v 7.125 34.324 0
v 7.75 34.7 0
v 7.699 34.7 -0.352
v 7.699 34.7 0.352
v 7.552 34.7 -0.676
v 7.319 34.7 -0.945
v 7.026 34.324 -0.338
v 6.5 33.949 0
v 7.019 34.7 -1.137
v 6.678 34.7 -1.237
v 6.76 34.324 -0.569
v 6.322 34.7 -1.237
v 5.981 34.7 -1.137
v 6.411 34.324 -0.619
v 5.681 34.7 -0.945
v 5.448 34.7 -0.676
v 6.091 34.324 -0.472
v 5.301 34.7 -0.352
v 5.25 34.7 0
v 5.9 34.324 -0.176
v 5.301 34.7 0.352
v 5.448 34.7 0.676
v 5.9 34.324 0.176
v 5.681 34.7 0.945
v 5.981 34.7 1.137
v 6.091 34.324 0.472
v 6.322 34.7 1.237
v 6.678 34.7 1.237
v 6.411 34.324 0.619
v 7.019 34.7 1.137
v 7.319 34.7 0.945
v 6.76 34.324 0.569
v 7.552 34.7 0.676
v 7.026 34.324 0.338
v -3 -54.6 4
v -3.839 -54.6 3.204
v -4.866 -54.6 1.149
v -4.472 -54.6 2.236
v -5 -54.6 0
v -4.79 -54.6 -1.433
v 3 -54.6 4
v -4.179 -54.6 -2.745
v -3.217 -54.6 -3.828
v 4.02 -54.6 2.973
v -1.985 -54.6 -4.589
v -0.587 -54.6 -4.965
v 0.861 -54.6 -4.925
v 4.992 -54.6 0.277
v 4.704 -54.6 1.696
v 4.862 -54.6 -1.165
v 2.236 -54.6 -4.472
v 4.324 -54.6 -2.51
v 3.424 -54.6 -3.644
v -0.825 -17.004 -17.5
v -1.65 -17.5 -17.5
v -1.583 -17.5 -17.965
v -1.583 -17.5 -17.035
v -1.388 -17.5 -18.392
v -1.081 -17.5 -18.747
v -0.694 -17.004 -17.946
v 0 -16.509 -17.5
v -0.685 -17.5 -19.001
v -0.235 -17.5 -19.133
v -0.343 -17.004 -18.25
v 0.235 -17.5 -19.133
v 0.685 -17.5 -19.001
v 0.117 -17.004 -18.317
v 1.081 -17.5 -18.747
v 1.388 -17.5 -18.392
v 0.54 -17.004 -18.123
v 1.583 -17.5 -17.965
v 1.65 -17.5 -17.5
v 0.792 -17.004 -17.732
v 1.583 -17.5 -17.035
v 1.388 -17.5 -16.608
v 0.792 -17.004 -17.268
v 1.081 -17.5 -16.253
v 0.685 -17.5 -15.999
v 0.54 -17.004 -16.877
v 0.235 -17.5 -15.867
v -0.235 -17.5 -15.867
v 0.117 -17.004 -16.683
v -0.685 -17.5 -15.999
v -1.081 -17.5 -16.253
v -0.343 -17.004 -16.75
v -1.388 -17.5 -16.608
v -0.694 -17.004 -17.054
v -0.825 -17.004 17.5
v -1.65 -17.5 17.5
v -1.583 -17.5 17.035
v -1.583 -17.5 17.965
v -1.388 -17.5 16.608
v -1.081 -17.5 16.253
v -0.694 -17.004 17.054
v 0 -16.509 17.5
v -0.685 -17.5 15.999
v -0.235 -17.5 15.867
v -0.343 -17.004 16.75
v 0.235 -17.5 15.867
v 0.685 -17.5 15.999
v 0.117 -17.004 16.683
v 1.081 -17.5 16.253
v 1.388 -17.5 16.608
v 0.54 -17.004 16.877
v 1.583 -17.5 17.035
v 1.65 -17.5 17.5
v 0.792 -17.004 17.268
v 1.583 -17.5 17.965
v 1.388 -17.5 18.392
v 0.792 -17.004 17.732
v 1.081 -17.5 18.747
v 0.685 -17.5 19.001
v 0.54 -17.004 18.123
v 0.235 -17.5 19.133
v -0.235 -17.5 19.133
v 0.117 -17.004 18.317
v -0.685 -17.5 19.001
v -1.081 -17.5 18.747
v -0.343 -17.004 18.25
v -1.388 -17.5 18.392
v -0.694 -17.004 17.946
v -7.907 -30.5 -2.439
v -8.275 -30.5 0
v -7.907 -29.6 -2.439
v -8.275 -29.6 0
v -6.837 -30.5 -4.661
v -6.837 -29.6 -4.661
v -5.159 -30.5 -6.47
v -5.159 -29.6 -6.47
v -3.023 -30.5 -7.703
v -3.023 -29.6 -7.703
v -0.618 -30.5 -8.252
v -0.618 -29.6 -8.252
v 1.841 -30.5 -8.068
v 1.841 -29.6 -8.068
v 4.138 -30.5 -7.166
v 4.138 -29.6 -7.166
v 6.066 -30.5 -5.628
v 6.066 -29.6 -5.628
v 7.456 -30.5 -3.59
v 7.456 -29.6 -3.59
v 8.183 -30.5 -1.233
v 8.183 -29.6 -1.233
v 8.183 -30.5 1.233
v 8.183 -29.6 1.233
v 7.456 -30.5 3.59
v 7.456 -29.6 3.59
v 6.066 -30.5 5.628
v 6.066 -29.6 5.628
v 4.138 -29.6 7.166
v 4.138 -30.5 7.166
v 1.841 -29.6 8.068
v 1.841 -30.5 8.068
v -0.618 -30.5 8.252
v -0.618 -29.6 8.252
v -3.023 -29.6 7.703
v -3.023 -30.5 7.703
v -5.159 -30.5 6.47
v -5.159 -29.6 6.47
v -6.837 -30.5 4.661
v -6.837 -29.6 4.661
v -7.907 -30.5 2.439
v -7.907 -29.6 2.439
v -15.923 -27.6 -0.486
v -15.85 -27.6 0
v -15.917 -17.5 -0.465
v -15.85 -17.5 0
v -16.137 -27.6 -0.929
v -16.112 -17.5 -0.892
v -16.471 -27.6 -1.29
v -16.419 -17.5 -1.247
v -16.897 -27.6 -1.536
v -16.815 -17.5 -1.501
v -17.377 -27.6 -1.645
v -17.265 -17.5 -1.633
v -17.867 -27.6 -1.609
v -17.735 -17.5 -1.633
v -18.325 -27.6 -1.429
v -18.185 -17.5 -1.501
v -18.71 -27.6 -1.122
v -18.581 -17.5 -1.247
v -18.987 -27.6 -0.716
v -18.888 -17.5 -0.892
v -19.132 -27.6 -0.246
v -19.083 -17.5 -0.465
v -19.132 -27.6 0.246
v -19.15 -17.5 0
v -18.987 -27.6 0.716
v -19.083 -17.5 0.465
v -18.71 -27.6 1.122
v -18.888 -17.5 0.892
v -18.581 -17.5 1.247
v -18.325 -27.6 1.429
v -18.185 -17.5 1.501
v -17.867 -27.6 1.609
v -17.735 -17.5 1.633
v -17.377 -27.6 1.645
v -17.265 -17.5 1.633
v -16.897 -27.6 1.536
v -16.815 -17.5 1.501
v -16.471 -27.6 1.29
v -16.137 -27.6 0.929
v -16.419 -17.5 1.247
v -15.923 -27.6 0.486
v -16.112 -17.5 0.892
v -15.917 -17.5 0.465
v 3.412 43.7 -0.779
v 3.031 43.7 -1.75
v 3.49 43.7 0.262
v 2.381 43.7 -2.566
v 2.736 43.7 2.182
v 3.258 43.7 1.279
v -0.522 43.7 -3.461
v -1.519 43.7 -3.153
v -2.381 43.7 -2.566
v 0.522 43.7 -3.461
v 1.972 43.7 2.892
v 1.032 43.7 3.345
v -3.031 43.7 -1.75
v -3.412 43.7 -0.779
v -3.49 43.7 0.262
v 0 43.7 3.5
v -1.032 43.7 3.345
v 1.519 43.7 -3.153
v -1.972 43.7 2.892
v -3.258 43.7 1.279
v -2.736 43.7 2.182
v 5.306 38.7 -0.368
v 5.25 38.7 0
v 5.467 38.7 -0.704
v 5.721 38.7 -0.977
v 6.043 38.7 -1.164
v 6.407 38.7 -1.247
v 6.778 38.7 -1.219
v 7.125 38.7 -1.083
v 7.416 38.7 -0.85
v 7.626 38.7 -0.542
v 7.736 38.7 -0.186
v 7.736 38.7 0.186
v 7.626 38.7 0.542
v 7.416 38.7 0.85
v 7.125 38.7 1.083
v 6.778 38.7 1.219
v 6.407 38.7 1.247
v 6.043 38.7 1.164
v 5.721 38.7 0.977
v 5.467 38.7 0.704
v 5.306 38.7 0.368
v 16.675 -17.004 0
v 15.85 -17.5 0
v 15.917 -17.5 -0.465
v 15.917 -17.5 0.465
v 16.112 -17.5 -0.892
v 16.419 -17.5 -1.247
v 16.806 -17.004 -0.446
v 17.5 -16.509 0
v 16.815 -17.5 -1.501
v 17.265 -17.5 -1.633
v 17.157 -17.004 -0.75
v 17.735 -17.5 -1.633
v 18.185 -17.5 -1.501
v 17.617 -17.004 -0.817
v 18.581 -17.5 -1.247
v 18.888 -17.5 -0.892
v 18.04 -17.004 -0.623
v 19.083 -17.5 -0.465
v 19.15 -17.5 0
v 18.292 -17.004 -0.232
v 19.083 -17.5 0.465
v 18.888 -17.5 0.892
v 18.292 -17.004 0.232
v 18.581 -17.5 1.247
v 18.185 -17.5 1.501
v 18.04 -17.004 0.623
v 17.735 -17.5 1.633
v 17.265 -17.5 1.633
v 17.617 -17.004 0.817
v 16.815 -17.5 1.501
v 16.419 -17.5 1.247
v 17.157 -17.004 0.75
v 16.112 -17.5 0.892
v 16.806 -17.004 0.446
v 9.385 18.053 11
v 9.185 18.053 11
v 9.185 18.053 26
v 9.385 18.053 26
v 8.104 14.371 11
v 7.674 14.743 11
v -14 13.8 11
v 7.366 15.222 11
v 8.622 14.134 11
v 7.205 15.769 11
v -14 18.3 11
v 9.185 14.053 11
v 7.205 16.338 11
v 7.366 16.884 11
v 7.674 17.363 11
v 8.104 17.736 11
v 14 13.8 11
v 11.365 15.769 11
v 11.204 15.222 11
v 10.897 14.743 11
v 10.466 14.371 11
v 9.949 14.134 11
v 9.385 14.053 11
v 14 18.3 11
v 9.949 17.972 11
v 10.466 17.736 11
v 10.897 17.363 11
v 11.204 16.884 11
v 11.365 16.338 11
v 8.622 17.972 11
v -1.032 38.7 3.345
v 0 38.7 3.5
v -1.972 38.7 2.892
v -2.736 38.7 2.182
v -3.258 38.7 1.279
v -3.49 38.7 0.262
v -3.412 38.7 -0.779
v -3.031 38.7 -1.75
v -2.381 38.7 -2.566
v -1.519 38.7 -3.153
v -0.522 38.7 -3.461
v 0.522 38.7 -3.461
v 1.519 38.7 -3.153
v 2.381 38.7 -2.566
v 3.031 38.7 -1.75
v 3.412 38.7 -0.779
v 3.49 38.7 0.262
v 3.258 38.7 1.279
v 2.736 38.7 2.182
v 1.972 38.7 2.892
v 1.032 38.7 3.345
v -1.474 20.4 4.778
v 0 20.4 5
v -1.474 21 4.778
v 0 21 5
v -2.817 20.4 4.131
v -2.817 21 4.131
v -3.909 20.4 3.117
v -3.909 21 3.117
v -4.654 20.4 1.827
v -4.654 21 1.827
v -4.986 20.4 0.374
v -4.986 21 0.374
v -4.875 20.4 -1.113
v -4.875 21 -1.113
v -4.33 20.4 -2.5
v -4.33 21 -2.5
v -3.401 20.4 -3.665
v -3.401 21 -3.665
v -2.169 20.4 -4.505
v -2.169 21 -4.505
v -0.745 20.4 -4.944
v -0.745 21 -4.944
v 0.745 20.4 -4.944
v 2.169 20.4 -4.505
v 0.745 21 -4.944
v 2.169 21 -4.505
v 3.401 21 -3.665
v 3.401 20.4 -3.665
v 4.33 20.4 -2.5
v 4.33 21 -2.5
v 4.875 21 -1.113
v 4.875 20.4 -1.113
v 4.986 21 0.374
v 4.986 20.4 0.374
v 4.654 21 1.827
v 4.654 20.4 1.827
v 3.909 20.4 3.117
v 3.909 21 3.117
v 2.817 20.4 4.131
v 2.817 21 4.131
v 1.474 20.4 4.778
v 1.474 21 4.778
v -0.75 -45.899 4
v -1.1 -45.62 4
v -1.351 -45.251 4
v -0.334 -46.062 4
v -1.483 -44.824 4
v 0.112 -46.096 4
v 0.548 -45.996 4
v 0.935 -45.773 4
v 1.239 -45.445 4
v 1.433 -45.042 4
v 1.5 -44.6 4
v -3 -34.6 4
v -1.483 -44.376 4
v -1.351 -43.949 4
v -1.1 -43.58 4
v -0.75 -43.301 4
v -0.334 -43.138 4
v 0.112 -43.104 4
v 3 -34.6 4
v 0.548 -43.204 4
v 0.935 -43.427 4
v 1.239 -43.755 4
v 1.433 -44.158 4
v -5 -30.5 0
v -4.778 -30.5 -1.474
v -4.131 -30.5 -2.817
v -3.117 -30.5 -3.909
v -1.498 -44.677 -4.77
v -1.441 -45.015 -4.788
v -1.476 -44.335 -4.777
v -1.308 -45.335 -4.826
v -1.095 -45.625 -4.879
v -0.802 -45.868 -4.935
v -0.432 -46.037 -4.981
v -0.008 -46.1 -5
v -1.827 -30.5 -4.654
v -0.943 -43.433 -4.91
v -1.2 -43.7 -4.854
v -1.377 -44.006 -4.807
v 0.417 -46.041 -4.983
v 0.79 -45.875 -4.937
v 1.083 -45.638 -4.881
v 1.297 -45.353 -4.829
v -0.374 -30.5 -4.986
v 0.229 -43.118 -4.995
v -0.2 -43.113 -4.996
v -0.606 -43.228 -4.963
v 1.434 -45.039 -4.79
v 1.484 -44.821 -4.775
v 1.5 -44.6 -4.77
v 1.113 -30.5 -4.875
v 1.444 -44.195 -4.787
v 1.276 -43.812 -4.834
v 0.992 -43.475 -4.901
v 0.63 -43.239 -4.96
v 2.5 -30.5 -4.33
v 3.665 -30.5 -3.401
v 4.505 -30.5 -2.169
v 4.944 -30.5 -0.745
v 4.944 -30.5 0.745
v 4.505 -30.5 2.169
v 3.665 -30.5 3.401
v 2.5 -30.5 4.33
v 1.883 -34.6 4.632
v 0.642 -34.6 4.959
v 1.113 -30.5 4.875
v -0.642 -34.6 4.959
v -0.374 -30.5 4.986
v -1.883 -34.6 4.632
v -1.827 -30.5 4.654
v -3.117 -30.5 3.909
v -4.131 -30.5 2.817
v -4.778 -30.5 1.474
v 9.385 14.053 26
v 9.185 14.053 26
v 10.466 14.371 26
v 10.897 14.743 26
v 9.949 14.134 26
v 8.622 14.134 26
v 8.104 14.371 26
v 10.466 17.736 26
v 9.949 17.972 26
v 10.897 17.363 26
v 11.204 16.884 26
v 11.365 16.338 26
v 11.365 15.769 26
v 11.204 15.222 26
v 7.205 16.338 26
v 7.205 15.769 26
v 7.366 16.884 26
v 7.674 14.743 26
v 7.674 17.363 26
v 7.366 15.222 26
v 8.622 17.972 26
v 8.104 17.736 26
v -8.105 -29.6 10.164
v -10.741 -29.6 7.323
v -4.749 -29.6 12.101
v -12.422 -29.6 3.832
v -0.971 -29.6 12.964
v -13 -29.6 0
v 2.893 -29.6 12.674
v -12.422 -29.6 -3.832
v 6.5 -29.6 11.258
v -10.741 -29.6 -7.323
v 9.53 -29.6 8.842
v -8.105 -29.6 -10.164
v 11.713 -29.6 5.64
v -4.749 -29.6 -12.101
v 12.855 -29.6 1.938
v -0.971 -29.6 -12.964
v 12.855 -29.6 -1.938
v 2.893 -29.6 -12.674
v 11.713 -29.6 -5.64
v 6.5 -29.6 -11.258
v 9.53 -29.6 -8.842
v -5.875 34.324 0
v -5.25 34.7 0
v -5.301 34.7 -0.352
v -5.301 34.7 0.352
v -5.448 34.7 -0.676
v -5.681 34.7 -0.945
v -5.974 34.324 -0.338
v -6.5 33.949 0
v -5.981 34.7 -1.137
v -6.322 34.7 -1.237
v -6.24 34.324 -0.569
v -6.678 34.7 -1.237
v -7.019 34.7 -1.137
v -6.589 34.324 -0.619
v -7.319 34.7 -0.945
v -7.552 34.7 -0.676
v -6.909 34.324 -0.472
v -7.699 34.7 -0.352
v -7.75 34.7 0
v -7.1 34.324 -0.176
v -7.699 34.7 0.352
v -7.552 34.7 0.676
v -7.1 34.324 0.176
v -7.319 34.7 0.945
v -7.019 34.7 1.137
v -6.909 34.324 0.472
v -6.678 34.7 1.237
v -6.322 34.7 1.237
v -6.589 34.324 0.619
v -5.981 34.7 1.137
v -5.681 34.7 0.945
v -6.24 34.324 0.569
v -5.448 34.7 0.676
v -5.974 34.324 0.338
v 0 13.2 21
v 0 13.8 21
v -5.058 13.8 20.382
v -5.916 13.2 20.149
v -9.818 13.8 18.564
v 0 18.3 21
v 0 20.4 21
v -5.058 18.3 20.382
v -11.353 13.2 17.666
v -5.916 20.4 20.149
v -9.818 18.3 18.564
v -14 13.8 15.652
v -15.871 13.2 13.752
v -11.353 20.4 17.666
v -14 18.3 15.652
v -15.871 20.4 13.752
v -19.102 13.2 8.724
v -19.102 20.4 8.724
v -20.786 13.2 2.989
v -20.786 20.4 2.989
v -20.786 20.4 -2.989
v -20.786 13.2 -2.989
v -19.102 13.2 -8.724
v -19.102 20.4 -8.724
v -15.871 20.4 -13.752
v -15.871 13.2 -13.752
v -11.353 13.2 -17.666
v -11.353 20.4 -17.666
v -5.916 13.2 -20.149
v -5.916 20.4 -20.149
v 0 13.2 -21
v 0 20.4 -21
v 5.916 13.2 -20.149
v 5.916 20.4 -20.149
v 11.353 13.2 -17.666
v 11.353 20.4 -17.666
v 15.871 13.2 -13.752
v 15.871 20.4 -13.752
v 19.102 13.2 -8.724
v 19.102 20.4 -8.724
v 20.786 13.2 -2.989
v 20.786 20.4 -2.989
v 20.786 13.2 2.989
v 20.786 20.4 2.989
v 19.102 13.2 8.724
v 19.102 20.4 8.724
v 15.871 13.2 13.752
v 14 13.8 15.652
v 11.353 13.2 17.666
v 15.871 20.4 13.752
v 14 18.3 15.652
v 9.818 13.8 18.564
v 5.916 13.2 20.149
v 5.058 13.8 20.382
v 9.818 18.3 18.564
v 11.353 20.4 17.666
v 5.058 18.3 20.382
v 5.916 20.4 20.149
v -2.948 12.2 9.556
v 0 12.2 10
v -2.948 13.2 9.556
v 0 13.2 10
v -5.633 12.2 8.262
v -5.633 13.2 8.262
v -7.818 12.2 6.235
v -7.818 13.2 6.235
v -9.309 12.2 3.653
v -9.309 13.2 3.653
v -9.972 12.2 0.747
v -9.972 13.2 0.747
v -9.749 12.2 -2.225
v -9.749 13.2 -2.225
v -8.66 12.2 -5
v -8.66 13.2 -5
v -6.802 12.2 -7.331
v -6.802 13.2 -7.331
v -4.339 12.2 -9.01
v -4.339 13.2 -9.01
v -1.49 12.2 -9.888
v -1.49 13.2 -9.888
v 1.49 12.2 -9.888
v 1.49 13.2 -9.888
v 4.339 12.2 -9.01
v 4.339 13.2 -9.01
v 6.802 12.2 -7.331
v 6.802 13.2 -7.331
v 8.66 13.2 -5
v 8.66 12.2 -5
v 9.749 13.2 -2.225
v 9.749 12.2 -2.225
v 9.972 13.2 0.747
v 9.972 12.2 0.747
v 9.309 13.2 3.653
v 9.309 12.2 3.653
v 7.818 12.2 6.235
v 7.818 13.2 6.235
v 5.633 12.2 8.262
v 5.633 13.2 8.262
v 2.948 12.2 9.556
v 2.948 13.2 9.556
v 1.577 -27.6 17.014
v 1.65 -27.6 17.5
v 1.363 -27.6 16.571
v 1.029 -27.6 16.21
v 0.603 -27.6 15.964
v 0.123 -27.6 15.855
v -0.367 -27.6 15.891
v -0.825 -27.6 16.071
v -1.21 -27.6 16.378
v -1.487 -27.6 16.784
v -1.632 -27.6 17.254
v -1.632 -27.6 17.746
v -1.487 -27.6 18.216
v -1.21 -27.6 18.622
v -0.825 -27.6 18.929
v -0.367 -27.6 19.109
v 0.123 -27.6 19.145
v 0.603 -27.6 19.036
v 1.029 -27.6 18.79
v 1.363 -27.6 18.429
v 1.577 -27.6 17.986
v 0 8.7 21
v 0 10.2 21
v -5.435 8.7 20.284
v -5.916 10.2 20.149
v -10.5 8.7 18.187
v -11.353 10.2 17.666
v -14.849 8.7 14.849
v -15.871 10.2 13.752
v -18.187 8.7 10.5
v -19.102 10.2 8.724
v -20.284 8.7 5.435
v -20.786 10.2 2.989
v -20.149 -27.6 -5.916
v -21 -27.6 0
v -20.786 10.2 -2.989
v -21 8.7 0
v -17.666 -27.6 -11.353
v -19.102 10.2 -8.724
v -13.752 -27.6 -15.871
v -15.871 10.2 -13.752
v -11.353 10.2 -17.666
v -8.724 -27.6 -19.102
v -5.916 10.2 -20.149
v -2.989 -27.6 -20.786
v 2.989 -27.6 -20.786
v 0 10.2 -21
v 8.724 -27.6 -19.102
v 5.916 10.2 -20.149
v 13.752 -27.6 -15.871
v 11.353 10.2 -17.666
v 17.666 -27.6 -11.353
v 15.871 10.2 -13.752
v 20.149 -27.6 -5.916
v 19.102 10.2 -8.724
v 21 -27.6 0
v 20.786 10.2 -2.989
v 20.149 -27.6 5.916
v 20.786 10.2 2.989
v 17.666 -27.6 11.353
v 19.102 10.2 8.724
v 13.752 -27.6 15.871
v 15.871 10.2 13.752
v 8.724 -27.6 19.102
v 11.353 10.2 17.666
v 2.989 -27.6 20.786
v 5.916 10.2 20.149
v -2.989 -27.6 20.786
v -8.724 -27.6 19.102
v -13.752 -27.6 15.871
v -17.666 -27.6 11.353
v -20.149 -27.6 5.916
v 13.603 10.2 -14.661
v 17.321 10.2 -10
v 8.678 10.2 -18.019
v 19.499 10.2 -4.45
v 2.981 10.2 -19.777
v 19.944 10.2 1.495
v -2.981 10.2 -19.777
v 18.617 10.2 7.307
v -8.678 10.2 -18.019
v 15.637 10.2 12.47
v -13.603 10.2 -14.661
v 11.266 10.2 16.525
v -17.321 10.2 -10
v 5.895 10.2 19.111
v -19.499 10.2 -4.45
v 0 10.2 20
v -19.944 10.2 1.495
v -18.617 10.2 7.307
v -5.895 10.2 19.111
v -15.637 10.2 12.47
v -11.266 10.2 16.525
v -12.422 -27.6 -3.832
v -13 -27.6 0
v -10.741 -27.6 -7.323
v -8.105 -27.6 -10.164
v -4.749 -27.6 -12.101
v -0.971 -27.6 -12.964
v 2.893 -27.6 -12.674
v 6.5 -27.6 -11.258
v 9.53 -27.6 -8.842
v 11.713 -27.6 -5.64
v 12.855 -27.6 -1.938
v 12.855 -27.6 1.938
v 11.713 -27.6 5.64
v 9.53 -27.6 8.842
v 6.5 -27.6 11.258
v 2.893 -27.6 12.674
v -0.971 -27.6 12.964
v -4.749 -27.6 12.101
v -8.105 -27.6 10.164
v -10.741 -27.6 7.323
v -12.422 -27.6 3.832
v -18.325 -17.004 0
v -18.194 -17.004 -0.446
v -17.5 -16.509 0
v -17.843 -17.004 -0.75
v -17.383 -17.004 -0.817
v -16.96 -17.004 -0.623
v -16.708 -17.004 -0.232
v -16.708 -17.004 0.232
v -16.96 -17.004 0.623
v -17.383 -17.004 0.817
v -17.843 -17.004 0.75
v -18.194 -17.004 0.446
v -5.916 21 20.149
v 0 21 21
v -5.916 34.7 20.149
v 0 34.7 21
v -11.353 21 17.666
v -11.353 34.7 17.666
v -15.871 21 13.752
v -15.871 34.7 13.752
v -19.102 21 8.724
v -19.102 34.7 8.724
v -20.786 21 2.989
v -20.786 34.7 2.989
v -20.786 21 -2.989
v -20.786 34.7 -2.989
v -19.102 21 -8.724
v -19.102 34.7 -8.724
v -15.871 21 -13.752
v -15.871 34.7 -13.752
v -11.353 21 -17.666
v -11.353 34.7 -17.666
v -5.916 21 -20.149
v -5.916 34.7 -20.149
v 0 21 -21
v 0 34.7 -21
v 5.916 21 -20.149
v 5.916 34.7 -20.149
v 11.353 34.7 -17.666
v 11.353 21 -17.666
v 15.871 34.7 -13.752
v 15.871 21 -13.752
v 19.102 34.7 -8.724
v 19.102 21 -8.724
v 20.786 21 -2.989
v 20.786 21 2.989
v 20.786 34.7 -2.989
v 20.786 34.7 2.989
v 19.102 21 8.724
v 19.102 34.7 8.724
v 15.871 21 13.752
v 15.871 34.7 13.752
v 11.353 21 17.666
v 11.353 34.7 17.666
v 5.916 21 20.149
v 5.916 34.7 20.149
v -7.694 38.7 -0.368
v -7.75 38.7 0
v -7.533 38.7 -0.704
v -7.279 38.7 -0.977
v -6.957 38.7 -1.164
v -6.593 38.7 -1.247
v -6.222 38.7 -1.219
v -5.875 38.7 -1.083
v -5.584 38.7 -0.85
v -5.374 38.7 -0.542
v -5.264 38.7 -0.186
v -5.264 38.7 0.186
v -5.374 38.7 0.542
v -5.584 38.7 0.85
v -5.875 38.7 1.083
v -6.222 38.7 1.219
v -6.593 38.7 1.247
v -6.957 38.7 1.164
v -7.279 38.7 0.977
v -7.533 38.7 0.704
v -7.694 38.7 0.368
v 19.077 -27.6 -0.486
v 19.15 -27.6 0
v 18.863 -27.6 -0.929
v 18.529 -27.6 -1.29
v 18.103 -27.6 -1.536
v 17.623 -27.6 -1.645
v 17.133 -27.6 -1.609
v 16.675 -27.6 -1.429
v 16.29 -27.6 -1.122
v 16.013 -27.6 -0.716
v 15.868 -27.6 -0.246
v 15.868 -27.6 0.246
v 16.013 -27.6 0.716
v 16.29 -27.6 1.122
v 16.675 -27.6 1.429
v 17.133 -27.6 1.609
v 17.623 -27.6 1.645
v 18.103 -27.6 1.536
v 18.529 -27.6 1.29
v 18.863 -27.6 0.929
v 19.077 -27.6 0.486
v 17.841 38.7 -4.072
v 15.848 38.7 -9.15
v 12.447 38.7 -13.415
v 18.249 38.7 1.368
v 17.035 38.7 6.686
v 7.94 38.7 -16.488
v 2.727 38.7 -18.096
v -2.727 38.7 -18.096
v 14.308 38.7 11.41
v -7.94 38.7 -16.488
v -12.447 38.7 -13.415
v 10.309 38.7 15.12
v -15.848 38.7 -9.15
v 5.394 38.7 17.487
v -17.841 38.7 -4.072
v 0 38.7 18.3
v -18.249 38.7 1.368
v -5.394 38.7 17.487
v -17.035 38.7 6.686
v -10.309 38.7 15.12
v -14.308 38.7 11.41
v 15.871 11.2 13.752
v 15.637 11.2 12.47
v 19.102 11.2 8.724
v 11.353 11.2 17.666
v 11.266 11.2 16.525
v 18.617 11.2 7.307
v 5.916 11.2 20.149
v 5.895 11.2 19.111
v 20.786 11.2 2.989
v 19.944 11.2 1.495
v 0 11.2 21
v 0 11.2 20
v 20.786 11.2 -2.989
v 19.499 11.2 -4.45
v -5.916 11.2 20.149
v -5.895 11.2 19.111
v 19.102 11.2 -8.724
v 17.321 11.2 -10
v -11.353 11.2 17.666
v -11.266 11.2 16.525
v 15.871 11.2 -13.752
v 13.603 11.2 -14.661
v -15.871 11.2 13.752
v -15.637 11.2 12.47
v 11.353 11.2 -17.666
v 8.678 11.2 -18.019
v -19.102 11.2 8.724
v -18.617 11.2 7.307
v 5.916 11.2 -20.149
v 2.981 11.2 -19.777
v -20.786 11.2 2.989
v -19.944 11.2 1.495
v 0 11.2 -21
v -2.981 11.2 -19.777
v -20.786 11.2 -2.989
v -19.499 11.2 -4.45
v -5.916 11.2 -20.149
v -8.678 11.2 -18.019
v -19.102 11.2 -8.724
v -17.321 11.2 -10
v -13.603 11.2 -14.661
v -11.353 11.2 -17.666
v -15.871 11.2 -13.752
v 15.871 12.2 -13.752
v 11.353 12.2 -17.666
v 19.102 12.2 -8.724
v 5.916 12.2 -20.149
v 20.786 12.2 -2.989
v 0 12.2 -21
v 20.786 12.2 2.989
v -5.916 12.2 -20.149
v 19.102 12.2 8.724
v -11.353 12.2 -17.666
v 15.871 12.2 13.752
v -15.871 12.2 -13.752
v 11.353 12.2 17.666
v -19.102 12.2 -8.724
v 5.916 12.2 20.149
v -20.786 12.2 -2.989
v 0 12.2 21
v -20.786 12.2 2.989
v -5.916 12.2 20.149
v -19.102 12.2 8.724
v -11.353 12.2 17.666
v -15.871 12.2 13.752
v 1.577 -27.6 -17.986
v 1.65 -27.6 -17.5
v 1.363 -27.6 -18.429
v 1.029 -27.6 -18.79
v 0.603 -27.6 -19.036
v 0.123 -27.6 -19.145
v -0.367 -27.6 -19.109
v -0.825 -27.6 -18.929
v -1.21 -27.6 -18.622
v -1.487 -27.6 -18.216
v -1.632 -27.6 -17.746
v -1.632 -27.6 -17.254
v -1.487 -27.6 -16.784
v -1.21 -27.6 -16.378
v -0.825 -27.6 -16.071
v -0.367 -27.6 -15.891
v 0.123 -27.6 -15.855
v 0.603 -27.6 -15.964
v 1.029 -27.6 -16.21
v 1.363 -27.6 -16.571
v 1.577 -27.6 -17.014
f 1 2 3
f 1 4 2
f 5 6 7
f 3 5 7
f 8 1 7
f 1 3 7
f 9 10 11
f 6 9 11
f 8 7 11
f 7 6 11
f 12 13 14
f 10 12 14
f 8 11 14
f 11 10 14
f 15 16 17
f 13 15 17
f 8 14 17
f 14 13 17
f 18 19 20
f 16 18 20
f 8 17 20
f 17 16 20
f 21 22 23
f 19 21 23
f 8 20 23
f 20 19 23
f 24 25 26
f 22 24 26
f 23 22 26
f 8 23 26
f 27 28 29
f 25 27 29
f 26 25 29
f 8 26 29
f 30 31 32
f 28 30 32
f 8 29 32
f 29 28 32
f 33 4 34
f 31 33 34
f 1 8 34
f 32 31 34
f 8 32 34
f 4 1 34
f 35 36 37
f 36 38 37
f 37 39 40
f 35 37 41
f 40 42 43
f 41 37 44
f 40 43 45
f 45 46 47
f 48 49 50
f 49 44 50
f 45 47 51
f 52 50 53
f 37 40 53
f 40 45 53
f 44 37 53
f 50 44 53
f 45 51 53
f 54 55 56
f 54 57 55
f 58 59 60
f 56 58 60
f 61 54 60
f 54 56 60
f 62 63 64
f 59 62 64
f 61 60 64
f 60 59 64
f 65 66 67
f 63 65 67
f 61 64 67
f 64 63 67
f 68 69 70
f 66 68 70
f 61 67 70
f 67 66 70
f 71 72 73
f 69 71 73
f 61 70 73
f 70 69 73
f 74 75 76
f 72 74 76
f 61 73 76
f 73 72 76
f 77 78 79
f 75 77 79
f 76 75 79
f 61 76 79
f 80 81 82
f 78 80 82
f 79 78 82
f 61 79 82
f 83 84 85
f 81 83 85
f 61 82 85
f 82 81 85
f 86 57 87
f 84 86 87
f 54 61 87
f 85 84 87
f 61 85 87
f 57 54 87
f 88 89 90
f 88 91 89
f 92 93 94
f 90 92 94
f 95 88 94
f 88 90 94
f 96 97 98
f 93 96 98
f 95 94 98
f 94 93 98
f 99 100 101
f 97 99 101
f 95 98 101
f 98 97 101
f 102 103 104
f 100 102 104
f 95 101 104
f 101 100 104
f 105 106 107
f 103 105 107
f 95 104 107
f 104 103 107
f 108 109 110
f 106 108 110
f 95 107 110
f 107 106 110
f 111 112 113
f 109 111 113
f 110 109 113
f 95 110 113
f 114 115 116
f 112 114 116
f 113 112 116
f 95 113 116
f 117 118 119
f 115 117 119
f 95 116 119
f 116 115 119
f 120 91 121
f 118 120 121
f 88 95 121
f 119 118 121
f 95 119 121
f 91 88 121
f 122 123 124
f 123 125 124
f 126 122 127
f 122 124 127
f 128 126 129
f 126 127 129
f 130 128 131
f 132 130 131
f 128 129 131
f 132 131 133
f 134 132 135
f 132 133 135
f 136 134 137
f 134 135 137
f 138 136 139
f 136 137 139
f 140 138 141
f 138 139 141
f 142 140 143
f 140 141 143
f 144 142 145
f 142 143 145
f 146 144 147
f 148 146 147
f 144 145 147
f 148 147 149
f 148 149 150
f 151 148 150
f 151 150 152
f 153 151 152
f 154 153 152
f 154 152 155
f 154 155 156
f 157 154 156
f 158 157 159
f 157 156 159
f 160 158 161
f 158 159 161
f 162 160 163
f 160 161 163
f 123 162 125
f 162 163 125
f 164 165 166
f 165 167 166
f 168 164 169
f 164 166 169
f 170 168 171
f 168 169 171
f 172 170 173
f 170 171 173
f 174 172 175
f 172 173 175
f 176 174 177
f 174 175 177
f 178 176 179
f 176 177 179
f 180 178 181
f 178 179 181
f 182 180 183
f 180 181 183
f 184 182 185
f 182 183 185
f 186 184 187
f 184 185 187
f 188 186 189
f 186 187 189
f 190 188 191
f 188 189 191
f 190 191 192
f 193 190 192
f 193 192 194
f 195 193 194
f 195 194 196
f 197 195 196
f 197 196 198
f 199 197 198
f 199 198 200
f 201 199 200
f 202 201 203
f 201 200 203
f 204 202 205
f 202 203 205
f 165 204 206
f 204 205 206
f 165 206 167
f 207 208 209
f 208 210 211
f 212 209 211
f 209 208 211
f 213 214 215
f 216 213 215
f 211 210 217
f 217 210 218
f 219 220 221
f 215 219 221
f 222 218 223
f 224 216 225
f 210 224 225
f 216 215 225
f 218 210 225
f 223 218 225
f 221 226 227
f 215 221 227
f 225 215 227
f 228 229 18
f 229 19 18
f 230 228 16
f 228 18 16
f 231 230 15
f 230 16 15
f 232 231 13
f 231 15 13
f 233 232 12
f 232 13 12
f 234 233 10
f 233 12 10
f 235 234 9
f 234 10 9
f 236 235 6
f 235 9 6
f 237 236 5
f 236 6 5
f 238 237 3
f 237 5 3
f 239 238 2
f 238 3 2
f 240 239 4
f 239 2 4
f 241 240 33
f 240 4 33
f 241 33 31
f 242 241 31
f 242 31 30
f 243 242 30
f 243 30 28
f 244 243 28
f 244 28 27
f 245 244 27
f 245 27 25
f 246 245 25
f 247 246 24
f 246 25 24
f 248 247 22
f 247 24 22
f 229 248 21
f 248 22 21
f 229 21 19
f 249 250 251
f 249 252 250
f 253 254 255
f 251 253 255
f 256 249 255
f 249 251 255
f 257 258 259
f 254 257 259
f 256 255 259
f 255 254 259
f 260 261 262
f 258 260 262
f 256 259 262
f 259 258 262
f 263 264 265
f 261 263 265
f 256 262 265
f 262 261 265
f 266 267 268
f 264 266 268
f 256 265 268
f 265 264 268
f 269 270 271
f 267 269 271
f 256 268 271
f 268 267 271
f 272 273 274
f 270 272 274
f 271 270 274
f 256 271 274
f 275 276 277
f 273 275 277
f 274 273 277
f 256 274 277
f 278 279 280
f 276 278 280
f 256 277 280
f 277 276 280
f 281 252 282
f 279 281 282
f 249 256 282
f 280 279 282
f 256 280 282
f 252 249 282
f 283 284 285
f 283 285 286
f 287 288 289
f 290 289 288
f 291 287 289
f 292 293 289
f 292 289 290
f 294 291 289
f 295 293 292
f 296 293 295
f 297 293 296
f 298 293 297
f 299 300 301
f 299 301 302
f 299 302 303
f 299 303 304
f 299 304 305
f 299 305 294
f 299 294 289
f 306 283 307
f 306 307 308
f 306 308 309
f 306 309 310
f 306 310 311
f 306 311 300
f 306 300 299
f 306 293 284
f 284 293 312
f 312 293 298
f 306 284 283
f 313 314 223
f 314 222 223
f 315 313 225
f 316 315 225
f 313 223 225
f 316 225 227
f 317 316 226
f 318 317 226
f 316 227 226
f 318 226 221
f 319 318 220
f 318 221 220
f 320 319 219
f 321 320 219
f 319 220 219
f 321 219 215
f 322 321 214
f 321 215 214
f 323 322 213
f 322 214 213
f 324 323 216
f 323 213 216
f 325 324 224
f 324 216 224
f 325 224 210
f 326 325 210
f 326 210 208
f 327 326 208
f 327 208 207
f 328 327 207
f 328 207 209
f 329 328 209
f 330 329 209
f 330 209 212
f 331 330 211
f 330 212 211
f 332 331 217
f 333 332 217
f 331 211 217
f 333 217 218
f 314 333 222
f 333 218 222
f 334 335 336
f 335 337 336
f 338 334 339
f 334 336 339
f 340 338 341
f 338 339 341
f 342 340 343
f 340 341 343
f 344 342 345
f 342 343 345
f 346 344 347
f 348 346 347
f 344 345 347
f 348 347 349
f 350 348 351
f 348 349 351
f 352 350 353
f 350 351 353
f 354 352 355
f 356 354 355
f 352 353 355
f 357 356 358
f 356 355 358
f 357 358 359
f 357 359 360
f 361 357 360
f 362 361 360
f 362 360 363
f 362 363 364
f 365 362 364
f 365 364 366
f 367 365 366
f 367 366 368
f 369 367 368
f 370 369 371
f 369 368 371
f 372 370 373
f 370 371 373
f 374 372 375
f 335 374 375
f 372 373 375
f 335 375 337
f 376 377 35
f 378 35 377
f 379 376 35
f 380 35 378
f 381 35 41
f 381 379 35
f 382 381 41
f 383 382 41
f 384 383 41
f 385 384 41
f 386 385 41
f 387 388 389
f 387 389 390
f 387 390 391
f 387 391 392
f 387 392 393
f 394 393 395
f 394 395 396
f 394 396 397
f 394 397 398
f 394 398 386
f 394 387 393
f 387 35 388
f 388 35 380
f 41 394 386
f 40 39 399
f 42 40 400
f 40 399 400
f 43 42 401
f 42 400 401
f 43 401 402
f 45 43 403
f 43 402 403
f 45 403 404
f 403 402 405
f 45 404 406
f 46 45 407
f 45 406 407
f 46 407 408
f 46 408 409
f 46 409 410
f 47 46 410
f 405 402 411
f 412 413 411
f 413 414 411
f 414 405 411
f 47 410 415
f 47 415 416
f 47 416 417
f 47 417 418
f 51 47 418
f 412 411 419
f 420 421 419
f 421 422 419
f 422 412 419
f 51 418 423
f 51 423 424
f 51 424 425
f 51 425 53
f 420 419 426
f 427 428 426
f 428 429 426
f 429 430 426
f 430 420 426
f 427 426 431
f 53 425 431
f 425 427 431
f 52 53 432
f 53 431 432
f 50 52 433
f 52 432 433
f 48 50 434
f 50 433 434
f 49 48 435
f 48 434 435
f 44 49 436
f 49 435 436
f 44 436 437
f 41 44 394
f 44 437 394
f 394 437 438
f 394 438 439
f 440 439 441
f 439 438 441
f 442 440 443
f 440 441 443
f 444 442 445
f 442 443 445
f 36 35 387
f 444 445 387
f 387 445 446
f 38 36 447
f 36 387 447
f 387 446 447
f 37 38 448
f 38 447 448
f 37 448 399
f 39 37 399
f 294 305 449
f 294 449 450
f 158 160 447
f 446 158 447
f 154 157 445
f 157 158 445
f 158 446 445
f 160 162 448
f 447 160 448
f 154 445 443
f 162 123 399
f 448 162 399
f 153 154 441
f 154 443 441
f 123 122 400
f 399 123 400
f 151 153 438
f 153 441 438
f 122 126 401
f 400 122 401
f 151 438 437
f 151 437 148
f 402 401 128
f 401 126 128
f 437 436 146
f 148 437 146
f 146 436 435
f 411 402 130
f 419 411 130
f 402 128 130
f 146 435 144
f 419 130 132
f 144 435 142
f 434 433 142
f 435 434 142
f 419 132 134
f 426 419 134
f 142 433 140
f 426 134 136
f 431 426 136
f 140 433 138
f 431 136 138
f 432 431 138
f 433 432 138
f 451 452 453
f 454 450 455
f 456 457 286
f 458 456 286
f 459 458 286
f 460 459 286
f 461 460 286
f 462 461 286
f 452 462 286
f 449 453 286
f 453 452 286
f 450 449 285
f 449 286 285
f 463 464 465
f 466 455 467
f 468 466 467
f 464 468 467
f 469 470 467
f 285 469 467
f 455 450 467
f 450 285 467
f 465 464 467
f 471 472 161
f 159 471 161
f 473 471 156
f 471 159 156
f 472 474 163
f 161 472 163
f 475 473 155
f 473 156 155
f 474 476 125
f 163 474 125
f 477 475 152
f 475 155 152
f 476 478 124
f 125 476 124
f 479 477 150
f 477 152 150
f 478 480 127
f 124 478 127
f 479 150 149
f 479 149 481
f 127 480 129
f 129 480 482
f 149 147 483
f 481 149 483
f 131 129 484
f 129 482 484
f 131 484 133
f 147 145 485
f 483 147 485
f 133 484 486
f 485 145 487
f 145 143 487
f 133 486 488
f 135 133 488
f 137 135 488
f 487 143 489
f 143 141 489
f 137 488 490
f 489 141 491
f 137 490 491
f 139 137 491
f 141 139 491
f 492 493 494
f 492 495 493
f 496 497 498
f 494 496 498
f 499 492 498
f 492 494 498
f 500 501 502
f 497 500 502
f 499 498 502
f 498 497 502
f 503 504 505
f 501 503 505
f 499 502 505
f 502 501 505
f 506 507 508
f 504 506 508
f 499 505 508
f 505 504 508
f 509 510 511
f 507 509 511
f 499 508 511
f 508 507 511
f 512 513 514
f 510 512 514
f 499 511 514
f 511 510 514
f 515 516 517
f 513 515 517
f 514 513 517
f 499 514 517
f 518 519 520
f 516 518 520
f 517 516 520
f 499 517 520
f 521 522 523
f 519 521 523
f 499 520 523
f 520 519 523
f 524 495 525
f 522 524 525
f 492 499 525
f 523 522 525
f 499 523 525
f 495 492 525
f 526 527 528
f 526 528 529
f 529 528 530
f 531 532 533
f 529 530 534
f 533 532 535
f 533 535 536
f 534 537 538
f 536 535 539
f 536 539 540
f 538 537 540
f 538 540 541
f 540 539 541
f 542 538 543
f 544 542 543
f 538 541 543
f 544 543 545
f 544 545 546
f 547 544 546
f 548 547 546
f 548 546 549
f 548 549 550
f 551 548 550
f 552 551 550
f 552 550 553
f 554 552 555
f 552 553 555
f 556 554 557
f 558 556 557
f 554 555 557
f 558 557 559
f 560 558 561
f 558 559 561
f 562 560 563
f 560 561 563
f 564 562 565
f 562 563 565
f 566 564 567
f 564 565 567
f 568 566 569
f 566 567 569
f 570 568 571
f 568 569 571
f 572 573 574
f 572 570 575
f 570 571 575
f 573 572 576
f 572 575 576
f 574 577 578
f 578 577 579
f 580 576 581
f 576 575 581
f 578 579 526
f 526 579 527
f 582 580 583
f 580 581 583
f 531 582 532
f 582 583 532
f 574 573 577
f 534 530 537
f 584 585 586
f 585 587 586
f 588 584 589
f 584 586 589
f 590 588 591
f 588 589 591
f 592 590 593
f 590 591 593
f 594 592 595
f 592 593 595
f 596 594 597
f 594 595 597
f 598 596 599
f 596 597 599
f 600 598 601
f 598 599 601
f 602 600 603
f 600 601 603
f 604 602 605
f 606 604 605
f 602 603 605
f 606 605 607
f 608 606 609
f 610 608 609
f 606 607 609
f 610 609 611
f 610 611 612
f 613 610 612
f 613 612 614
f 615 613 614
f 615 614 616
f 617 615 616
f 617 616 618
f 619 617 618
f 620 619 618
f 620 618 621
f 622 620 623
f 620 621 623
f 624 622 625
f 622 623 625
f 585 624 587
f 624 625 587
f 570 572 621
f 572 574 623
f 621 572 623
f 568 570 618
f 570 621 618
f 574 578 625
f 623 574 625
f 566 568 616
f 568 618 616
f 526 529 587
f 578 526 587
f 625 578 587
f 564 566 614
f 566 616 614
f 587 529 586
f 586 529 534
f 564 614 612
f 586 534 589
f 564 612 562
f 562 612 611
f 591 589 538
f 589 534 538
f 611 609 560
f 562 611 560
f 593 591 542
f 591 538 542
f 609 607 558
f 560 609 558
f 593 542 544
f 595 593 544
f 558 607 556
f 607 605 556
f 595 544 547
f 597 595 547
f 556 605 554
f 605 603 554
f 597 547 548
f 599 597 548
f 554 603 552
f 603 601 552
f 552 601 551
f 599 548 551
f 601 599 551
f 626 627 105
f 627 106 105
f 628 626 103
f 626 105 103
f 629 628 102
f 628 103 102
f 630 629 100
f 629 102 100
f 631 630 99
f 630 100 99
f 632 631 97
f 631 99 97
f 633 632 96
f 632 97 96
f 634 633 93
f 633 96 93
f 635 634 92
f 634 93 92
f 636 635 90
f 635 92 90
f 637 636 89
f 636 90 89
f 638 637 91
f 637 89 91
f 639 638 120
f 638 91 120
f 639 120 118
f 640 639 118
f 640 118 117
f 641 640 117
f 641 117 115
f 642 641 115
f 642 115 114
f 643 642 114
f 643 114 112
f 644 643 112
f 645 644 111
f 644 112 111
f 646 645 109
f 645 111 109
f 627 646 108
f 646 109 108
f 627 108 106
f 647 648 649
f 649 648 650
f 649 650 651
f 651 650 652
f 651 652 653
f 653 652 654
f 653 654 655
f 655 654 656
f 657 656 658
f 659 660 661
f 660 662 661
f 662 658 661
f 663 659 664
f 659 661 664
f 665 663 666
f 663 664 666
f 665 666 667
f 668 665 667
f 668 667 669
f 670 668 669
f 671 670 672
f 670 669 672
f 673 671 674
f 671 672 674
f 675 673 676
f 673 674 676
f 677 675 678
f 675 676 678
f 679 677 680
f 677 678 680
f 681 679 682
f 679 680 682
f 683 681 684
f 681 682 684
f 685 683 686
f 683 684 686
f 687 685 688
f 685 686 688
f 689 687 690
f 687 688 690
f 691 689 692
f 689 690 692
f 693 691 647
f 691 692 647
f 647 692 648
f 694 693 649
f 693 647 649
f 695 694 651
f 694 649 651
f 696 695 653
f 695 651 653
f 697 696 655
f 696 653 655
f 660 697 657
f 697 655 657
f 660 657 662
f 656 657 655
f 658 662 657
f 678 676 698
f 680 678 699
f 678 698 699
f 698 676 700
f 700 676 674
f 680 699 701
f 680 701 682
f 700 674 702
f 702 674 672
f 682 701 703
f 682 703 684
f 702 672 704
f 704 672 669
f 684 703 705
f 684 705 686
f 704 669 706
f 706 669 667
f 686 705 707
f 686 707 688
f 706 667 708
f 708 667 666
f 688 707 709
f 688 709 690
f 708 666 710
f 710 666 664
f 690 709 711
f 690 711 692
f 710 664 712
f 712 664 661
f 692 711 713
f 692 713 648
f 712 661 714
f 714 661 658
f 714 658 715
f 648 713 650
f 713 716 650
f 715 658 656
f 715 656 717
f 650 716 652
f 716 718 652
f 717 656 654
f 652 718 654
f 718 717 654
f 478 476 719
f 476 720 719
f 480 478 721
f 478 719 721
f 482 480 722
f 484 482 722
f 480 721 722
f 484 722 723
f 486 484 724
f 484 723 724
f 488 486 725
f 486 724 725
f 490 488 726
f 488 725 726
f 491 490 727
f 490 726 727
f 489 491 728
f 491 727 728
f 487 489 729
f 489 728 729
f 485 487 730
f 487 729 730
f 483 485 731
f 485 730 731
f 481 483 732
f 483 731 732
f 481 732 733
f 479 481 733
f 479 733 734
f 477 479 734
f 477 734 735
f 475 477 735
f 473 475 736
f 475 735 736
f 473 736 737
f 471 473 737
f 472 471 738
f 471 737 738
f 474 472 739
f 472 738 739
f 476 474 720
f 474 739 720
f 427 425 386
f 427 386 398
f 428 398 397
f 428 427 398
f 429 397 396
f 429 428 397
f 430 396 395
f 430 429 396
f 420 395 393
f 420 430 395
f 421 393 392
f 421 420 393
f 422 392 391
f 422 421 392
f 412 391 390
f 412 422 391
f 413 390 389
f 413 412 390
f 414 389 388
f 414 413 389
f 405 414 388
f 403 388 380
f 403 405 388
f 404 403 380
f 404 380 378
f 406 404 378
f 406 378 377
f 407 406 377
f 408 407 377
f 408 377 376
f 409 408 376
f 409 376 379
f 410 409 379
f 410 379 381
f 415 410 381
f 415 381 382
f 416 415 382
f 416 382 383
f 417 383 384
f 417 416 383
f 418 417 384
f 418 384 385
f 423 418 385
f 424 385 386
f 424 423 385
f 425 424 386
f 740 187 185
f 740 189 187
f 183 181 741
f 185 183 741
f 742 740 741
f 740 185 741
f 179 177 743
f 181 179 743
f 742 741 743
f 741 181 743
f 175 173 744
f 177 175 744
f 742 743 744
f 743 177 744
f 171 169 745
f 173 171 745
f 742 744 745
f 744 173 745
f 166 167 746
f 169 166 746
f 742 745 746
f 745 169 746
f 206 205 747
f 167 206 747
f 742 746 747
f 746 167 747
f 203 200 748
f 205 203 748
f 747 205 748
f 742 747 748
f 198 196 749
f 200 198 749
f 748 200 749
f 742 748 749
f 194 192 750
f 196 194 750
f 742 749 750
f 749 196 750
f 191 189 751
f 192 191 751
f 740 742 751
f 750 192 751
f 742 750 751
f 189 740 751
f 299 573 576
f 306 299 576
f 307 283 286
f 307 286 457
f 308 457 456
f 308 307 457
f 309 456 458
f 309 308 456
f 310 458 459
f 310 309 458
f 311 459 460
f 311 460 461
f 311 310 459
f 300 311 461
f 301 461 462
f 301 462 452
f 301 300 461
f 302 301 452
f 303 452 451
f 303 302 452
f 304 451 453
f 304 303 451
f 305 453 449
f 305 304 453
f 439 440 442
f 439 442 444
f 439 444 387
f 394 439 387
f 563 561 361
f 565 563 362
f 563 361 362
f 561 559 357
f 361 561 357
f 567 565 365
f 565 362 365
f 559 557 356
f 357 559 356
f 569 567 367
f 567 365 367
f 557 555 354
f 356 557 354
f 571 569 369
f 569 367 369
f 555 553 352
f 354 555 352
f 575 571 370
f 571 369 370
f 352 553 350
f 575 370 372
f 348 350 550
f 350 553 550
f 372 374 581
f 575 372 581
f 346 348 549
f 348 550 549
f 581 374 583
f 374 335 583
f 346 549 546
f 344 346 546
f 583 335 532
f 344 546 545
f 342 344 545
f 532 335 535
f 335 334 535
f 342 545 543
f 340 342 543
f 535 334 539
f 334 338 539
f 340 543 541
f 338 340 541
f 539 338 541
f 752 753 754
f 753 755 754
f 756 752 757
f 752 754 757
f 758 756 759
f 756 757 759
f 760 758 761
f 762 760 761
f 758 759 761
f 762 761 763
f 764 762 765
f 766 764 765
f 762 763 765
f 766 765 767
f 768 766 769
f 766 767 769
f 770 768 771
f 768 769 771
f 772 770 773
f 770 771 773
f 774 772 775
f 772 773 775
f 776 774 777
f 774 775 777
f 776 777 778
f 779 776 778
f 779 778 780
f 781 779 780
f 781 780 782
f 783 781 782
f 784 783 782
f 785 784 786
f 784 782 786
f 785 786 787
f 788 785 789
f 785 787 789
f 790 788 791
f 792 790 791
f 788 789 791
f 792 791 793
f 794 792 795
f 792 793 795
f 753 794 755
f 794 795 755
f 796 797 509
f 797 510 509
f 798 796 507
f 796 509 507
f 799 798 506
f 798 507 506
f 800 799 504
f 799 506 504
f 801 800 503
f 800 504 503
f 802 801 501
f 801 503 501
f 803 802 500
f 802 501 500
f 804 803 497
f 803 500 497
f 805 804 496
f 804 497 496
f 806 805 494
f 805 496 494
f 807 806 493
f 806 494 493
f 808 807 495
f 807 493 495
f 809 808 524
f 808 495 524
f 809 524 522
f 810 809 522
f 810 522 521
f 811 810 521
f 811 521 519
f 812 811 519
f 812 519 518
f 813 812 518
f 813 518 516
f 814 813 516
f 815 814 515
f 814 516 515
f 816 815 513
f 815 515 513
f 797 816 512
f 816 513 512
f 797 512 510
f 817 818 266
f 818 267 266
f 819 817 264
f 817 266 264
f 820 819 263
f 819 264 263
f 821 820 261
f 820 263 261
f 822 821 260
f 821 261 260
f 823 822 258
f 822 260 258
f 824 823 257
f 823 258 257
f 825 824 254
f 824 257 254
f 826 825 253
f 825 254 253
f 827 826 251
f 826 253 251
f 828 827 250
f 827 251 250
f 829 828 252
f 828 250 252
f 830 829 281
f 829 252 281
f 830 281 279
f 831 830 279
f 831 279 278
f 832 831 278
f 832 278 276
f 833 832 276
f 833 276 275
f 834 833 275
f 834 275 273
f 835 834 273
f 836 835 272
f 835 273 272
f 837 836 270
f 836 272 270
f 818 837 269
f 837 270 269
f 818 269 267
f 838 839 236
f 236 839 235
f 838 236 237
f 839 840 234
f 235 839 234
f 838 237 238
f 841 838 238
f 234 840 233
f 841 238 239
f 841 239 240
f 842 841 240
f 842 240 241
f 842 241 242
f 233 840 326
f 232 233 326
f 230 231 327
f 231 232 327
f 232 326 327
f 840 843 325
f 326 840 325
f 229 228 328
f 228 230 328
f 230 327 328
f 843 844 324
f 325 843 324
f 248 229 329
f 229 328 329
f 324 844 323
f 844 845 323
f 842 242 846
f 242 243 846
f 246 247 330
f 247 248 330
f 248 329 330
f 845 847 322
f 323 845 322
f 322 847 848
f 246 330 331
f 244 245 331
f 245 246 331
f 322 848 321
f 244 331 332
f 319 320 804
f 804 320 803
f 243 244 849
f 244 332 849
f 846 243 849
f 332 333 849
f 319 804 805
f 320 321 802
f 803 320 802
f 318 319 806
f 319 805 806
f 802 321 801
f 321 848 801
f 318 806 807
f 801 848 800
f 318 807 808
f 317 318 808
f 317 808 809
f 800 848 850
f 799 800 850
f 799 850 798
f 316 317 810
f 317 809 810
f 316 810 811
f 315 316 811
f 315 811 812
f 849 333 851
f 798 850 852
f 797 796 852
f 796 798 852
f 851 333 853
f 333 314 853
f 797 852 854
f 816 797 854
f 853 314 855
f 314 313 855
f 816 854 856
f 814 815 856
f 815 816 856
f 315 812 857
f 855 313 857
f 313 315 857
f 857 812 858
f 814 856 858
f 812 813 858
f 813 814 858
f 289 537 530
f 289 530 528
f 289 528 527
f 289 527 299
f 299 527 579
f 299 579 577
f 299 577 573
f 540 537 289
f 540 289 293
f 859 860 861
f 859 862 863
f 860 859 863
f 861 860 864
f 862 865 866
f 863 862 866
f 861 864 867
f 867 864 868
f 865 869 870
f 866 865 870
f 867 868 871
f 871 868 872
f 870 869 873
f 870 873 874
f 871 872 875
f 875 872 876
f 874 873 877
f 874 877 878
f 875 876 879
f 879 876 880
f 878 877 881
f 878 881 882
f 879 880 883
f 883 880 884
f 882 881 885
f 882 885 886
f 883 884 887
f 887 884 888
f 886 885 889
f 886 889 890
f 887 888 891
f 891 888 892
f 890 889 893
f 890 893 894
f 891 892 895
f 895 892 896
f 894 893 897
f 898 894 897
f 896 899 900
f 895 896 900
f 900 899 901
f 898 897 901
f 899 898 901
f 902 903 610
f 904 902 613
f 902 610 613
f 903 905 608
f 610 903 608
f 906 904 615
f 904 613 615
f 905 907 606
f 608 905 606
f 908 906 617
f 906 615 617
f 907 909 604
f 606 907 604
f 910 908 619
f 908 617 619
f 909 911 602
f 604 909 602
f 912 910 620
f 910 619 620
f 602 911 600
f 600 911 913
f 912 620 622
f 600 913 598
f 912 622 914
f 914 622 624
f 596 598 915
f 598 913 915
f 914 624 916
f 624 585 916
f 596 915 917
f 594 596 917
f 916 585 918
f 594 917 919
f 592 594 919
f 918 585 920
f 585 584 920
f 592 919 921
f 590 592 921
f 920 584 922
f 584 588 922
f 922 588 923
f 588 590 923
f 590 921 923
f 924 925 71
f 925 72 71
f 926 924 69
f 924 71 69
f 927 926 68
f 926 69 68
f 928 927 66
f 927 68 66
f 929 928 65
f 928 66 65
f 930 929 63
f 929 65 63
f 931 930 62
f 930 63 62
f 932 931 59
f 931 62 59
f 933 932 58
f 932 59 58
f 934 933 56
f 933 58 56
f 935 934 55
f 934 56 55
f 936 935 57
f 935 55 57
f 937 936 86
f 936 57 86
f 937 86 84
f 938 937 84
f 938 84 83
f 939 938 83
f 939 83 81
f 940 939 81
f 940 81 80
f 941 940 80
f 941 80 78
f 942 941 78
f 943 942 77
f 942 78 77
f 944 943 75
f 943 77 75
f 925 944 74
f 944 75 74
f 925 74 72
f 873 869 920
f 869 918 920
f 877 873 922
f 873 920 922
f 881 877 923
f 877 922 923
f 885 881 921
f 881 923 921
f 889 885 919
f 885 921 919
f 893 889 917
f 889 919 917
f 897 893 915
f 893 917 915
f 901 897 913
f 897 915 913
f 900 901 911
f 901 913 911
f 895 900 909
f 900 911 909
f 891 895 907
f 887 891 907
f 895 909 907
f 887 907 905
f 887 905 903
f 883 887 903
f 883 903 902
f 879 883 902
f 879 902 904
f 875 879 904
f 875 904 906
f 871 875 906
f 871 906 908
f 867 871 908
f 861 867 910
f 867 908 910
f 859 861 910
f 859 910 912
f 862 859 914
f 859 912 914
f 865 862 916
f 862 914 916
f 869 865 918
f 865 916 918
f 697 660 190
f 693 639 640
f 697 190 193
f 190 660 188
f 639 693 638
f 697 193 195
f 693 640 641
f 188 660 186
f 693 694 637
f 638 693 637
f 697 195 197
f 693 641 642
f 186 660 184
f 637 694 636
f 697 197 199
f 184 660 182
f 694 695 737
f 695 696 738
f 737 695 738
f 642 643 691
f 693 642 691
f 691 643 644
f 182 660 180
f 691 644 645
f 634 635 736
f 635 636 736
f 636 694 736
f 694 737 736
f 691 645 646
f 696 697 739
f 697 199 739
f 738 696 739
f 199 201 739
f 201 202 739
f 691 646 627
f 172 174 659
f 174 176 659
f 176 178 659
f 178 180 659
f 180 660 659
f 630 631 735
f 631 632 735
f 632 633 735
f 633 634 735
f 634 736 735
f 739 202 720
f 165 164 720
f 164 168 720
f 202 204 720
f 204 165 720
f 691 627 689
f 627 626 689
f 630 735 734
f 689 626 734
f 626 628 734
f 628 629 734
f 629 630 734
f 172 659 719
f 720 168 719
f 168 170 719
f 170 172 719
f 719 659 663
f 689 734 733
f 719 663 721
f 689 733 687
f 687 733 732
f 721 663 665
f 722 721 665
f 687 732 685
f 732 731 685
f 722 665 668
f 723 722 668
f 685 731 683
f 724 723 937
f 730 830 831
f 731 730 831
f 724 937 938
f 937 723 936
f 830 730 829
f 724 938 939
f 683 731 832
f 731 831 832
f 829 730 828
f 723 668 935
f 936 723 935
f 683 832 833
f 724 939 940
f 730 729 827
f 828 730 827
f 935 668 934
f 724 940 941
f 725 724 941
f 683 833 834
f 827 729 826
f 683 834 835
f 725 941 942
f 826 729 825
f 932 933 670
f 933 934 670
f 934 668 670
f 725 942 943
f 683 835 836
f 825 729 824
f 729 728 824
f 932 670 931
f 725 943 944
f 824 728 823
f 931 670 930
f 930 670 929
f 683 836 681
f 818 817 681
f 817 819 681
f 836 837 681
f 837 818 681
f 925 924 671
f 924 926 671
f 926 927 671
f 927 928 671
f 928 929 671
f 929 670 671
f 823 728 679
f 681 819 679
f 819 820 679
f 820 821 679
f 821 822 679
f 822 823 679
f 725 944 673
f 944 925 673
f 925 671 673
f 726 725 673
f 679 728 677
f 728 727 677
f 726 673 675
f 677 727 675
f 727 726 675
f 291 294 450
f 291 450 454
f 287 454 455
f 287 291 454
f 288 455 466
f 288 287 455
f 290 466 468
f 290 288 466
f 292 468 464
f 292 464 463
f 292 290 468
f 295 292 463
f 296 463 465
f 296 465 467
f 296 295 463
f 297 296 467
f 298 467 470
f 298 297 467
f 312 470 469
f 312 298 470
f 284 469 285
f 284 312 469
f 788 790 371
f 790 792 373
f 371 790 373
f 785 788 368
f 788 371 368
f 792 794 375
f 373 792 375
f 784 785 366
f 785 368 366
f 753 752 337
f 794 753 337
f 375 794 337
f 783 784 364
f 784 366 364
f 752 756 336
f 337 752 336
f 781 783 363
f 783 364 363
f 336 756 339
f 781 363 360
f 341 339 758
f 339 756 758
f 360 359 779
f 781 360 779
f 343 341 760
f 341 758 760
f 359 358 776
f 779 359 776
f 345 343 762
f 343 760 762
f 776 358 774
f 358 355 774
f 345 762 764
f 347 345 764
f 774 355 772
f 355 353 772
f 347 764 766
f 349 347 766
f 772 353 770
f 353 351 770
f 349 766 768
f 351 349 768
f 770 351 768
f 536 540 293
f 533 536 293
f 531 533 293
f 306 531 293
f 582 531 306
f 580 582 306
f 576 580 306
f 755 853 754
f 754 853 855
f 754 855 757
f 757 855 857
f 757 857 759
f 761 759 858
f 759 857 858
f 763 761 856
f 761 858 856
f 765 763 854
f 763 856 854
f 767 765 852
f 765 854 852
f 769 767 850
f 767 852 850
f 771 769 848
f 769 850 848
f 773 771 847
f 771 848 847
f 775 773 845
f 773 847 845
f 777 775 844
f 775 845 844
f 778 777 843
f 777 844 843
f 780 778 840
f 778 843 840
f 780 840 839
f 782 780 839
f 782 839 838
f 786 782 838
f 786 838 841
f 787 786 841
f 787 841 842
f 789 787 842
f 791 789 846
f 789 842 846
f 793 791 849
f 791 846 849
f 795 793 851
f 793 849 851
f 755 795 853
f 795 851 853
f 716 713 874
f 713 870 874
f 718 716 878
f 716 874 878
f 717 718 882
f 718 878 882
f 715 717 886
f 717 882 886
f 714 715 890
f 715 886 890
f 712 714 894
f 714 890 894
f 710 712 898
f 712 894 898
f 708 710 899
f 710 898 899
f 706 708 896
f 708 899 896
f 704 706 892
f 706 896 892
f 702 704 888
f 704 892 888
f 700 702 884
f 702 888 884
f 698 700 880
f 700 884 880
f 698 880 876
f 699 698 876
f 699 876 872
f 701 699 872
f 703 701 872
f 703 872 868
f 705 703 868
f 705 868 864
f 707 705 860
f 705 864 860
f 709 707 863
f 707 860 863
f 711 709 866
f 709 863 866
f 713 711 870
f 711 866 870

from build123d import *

# Parameters (mm, degrees)
SKETCH_2_W               = 28
SKETCH_2_H               = 4.5
CUT_EXTRUDE_1_DEPTH      = 10
EXTRUDE_1_DEPTH          = 15
HOLE_WIZARD_M3_1_D       = 2.5
HOLE_WIZARD_M3_1_DEPTH   = 4
HOLE_WIZARD_M3_1_TIP     = 0.751075774
CUT_EXTRUDE_START        = -20
CUT_EXTRUDE_2_DEPTH      = 20
HOLE_WIZARD_M4_1_D       = 3.3
HOLE_WIZARD_M4_1_DEPTH   = 10.1
HOLE_WIZARD_M4_1_TIP     = 0.991420021
CUT_EXTRUDE_3_DEPTH      = 64.617293246
CUT_EXTRUDE_3_DEPTH_BACK = 64.617293246
SKETCH_11_R              = 1.5


with BuildPart() as part:
    # 草图1 → 旋转1 (revolve)
    with BuildSketch(Plane.XY, mode=Mode.PRIVATE) as revolve_1_sk:
        Polygon((0, 0), (4.1, 0), (4.1, 6.7), (13.4, 6.7), (13.4, 8.7), (21, 8.7), (21, 10.2), (20, 10.2), (20, 11.2), (21, 11.2), (21, 12.2), (10, 12.2), (10, 13.2), (21, 13.2), (21, 20.4), (5, 20.4), (5, 21), (21, 21), (21, 34.7), (18.3, 38.7), (3.5, 38.7), (3.5, 43.7), (0, 43.7), align=None)
    revolve(revolve_1_sk.sketch.rotate(Axis((0, 43.7, 0), (0, -1, 0)), 90), axis=Axis((0, 43.7, 0), (0, -1, 0)))

    # 草图2 → 切除-拉伸1 (cut)
    with BuildSketch(Plane.XY.offset(21)):
        with Locations((0, 16.05)):
            Rectangle(SKETCH_2_W, SKETCH_2_H)
    extrude(amount=-CUT_EXTRUDE_1_DEPTH, mode=Mode.SUBTRACT)

    # 草图3 → 凸台-拉伸1 (add)
    with BuildSketch(Plane.XY.offset(11)):
        with BuildLine():
            Line((9.185056323, 18.053194417), (9.385056323, 18.053194417))
            ThreePointArc((9.385056323, 18.053194417), (11.385056323, 16.053194417), (9.385056323, 14.053194417))
            Line((9.385056323, 14.053194417), (9.185056323, 14.053194417))
            ThreePointArc((9.185056323, 14.053194417), (7.185056323, 16.053194417), (9.185056323, 18.053194417))
        make_face()
    extrude(amount=EXTRUDE_1_DEPTH)

    # M3 螺纹孔1
    with Locations(Plane(origin=(0, 38.7, 0), x_dir=(1, 0, 0), z_dir=(0, 1, 0))):
        with Locations((-6.5, 0), (6.5, 0)):
            Hole(HOLE_WIZARD_M3_1_D / 2, depth=HOLE_WIZARD_M3_1_DEPTH)
            with Locations((0, 0, -(HOLE_WIZARD_M3_1_DEPTH + HOLE_WIZARD_M3_1_TIP / 2))):  # 118° drill point
                Cone(0, HOLE_WIZARD_M3_1_D / 2, HOLE_WIZARD_M3_1_TIP, mode=Mode.SUBTRACT)

    # 草图7 → 旋转2 (revolve)
    with BuildSketch(Plane.XY, mode=Mode.PRIVATE) as revolve_2_sk:
        Polygon((0, -54.6), (5, -54.6), (5, -30.5), (8.275, -30.5), (8.275, -29.6), (13, -29.6), (13, -27.6), (21, -27.6), (21, 8.7), (0, 8.7), align=None)
    revolve(revolve_2_sk.sketch.rotate(Axis((0, 8.7, 0), (0, -1, 0)), 180), axis=Axis((0, 8.7, 0), (0, -1, 0)))

    # 草图8 → 切除-拉伸2 (cut)
    with BuildSketch(Plane.XZ.offset(54.6).offset(CUT_EXTRUDE_START)):
        with BuildLine():
            Line((-3, 4), (3, 4))
            ThreePointArc((3, 4), (0, 5), (-3, 4))
        make_face()
    extrude(amount=CUT_EXTRUDE_2_DEPTH, mode=Mode.SUBTRACT)

    # M4 螺纹孔1
    with Locations(Plane(origin=(0, -27.6, 0), x_dir=(-1, 0, 0), z_dir=(0, -1, 0))):
        with Locations((0, -17.5), (-17.5, 0), (0, 17.5), (17.5, 0)):
            Hole(HOLE_WIZARD_M4_1_D / 2, depth=HOLE_WIZARD_M4_1_DEPTH)
            with Locations((0, 0, -(HOLE_WIZARD_M4_1_DEPTH + HOLE_WIZARD_M4_1_TIP / 2))):  # 118° drill point
                Cone(0, HOLE_WIZARD_M4_1_D / 2, HOLE_WIZARD_M4_1_TIP, mode=Mode.SUBTRACT)

    # 草图11 → 切除-拉伸3 (cut, two sides: drawn at the far end of the back side and taken through both)
    with BuildSketch(Plane.XY.offset(4).offset(-CUT_EXTRUDE_3_DEPTH_BACK)):
        with Locations((0, -44.6)):
            Circle(SKETCH_11_R)
    extrude(amount=CUT_EXTRUDE_3_DEPTH + CUT_EXTRUDE_3_DEPTH_BACK, mode=Mode.SUBTRACT)


solid = part.part
